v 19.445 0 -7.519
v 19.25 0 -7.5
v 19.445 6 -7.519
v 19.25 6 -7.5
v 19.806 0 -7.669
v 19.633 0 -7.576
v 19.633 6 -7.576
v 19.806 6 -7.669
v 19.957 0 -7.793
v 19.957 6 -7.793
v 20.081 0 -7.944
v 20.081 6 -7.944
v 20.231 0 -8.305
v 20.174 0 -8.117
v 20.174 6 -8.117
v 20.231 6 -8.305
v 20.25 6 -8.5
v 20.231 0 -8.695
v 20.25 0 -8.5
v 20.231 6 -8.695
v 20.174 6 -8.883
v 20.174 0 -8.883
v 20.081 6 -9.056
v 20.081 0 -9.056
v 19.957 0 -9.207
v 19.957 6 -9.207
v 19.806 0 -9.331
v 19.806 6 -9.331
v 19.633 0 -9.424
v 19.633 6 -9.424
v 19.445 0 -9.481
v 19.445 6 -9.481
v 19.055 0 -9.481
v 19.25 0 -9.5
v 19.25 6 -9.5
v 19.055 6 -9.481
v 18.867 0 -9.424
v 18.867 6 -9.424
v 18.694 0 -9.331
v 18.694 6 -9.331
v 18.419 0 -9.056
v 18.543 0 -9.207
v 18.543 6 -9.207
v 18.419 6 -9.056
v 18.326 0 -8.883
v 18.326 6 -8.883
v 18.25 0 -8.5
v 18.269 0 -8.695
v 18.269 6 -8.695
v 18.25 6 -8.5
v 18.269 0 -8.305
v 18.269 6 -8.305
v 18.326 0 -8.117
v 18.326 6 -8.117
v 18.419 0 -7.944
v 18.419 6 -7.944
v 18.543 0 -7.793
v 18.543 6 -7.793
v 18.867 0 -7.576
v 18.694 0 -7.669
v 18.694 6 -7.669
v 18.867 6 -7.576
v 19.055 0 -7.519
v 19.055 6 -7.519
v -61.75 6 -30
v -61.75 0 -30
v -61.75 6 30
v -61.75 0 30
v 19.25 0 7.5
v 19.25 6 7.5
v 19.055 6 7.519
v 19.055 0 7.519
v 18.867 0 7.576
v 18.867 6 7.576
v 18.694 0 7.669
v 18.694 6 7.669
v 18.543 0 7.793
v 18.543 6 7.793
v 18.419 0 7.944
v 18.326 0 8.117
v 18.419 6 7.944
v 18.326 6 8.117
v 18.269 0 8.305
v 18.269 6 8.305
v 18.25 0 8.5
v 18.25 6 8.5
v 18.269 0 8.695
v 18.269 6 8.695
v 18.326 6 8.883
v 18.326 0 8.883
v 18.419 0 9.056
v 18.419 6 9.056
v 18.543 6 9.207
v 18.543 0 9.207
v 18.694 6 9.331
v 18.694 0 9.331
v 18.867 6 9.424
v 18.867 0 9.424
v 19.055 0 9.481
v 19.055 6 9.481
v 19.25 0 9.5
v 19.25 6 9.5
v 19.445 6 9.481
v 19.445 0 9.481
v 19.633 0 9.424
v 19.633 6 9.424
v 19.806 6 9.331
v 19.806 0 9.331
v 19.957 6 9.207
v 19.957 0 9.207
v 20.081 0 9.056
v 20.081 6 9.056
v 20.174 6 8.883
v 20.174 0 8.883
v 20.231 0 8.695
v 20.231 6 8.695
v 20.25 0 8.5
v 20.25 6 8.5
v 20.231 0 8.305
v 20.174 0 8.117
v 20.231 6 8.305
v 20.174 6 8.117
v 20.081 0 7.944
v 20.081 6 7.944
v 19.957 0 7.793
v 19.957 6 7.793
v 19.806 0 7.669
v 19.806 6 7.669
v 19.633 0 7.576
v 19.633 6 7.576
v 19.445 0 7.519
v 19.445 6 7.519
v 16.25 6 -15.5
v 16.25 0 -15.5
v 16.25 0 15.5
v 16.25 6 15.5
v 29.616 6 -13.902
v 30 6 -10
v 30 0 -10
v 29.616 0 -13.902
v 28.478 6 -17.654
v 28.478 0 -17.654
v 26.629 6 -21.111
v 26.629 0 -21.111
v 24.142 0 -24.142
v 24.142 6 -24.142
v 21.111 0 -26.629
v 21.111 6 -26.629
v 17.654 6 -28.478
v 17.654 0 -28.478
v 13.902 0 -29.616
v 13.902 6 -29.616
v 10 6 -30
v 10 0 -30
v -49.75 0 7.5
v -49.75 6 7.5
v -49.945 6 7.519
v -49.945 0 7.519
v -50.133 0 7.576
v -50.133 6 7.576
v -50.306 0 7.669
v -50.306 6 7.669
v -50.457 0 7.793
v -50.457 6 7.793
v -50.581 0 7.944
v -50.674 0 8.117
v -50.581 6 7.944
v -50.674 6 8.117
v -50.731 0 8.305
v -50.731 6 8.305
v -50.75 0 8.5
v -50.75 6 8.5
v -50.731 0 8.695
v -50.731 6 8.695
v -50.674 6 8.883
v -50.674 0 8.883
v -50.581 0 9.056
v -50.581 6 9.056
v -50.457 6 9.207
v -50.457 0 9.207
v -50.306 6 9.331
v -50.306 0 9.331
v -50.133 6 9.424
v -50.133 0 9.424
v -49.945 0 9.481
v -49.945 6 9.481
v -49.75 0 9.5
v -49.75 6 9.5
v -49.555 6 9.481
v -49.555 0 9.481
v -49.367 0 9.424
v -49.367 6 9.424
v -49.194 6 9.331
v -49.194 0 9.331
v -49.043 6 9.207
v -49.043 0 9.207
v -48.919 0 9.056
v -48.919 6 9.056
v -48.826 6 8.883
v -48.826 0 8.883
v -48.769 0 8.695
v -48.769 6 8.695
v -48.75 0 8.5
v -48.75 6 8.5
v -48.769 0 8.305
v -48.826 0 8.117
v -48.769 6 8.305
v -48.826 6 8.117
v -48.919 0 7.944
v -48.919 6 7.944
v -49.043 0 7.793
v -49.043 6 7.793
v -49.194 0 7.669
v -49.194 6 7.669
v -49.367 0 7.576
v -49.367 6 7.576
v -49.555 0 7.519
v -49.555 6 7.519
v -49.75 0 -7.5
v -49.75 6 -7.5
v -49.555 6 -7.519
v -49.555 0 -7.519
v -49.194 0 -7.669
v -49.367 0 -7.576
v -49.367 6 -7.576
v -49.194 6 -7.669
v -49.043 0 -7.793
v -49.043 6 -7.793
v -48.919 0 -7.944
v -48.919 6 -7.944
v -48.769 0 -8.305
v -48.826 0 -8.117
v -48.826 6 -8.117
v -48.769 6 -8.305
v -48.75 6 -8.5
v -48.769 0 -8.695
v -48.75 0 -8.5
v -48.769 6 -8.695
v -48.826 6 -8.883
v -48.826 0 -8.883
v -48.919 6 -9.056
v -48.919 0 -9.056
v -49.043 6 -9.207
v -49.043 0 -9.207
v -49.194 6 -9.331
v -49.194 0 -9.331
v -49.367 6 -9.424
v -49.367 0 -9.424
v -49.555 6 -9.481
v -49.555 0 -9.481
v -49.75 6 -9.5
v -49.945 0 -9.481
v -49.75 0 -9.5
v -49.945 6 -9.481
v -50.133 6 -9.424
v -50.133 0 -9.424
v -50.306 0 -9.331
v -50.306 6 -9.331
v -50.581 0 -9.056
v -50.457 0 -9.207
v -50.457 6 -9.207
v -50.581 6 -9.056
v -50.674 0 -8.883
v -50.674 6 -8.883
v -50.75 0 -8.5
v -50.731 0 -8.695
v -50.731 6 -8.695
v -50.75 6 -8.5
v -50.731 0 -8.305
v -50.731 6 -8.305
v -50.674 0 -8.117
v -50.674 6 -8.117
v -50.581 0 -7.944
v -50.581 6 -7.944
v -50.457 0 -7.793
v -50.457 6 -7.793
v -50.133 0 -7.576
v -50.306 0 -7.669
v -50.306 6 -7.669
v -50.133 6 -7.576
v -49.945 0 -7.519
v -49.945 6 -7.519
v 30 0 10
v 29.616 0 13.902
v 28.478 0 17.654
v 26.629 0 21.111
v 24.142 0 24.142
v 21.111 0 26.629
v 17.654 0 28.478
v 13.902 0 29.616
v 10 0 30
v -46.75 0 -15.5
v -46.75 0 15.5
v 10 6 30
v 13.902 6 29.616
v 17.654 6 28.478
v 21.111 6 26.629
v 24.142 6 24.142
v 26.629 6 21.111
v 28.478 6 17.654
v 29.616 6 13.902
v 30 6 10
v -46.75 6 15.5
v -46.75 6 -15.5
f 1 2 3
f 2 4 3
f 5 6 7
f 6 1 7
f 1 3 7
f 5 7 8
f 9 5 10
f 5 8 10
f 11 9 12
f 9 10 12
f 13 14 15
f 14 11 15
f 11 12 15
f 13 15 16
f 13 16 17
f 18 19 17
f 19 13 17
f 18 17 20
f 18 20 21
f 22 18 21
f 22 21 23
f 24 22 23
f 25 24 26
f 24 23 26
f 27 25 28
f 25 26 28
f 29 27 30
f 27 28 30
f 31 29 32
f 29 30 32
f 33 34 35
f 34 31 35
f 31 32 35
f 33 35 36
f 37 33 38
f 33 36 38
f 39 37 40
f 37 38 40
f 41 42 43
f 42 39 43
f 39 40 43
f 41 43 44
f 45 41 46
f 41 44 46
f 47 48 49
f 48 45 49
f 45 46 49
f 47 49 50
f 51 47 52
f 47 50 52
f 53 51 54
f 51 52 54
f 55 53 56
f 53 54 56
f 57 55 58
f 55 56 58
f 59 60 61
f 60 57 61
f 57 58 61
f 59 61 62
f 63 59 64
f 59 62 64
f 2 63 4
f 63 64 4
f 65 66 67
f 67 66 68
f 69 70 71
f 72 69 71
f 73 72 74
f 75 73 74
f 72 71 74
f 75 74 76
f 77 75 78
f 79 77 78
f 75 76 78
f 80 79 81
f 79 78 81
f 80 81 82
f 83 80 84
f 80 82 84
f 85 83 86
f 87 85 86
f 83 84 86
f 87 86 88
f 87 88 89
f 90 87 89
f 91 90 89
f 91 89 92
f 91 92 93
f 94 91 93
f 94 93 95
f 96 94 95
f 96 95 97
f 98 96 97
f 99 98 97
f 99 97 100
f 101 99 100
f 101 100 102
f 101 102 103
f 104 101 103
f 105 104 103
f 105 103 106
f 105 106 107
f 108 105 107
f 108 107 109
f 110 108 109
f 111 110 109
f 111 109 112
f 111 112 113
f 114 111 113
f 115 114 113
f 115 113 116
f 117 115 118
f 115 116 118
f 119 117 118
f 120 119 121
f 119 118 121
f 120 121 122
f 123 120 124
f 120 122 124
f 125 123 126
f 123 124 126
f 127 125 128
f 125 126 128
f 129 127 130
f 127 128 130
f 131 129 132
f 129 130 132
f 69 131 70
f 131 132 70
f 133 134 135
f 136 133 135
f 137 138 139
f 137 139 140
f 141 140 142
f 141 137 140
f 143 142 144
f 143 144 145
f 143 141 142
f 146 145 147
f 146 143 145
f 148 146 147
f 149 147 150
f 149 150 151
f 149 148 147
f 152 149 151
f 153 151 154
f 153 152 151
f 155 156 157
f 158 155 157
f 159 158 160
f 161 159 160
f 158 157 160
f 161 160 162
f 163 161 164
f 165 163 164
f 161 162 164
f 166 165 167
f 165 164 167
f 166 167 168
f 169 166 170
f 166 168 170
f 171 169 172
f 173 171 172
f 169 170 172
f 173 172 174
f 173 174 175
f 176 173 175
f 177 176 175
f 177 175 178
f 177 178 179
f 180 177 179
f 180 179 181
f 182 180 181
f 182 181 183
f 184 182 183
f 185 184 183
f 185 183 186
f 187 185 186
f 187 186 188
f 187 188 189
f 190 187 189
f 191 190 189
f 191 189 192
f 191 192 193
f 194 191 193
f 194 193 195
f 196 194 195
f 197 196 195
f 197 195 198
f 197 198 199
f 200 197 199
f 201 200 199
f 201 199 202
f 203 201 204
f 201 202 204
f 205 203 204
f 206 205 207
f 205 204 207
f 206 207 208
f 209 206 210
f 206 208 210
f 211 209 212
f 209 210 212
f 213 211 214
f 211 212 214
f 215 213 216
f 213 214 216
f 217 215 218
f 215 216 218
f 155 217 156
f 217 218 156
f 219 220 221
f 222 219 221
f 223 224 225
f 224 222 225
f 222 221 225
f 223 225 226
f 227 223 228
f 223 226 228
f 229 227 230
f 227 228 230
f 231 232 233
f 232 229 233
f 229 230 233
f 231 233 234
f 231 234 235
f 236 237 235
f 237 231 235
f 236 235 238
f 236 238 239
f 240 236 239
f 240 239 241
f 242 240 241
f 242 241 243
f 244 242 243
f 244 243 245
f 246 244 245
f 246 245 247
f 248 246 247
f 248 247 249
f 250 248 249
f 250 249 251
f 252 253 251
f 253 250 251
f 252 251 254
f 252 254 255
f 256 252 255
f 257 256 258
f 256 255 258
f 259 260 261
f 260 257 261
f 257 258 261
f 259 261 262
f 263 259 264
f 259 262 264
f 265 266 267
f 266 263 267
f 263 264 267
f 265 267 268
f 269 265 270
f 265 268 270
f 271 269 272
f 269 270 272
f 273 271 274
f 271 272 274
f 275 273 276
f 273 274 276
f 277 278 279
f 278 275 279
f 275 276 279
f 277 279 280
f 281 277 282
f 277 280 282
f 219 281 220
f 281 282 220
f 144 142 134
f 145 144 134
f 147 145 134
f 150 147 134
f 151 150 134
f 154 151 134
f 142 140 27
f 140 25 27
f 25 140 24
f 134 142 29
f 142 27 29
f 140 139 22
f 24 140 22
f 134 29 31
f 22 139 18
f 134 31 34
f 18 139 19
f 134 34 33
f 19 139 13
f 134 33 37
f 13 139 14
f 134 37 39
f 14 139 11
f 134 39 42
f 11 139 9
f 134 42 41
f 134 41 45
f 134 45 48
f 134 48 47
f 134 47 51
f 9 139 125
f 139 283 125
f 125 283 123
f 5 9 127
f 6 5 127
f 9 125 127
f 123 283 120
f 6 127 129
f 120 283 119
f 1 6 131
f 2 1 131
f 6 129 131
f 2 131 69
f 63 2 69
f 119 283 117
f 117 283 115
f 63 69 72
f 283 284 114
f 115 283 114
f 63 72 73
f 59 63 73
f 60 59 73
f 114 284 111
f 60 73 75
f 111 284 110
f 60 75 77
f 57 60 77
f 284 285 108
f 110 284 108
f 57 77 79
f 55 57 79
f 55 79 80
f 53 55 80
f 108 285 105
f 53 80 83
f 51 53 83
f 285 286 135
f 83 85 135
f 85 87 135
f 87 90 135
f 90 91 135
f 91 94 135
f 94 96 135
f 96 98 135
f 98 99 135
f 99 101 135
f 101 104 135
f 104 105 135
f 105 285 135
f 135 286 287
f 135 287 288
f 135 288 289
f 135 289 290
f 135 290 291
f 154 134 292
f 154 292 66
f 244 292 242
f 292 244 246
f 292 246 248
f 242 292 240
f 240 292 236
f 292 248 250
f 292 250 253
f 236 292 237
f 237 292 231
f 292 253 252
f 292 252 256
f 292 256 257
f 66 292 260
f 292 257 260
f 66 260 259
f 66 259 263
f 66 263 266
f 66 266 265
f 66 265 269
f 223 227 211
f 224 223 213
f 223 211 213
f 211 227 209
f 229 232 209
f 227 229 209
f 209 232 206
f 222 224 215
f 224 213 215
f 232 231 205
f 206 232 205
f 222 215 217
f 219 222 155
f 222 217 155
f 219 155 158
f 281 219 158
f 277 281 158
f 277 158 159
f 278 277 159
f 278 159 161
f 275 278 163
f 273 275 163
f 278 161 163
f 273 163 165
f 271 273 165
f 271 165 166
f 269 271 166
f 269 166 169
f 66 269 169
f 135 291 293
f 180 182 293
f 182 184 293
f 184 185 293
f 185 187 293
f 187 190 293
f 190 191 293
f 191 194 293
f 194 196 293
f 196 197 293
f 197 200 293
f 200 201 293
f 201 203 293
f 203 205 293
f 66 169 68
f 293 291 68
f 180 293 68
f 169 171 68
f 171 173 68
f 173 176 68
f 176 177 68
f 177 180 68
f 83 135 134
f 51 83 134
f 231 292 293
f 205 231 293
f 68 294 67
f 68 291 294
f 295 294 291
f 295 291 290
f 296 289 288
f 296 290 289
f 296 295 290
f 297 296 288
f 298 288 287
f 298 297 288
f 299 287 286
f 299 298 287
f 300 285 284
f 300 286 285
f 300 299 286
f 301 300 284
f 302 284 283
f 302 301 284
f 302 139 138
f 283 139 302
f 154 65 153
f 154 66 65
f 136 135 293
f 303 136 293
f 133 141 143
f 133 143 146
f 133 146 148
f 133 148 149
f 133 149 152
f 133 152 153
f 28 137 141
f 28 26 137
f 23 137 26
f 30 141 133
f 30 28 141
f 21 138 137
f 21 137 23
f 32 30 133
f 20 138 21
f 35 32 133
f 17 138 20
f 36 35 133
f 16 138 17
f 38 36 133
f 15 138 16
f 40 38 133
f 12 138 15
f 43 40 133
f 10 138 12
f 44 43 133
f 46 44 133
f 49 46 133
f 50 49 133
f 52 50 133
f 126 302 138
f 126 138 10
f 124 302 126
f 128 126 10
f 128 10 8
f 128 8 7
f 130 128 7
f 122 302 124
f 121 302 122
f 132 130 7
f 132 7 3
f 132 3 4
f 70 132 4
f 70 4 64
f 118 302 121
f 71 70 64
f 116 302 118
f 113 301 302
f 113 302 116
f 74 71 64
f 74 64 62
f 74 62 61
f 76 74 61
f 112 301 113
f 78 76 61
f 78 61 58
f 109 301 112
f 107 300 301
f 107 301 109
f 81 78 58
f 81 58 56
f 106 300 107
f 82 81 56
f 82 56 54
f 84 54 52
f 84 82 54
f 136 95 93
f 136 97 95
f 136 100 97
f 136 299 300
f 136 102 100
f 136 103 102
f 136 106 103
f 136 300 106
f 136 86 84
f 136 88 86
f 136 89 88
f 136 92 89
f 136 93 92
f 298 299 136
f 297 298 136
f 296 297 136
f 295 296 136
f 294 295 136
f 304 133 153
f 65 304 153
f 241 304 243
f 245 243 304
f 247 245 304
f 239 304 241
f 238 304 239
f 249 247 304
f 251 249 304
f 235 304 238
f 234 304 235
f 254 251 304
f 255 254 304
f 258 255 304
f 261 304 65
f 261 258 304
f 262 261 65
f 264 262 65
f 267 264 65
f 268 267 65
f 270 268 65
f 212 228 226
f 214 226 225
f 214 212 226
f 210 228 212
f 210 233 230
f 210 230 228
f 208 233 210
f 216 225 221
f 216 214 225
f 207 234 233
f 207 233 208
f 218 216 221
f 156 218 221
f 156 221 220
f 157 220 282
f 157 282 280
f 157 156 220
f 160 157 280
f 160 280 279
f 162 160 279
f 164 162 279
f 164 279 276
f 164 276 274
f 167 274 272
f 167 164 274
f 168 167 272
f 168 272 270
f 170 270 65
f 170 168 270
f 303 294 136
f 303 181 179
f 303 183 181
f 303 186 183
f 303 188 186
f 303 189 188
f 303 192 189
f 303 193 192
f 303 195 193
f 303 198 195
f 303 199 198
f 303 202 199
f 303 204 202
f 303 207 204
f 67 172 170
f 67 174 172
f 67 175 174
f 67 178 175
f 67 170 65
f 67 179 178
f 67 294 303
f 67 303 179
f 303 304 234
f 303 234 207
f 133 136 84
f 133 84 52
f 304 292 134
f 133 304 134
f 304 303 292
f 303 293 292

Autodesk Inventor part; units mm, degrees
ref_plane "YZ Plane" through (0, 0, 0) normal (1, 0, 0) x (0, 1, 0)
ref_plane "XZ Plane" through (0, 0, 0) normal (0, 1, 0) x (-1, 0, 0)
ref_plane "XY Plane" through (0, 0, 0) normal (0, 0, 1) x (1, 0, 0)
sketch "Sketch1" plane through (0, 0, 0) normal (0, 1, 0) x (-1, 0, 0)
  line L0 (0, 0) -> (-16.25, 0)
  line L1 (0, 0) -> (46.75, 0)
  line L2 (300, 0) -> (330, 0) construction
  line L3 (330, 30) -> (-30, 30) construction
  line L4 (-16.25, 15.5) -> (46.75, 15.5)
  line L5 (46.75, 15.5) -> (46.75, 0)
  line L6 (46.75, -15.5) -> (-16.25, -15.5)
  line L7 (-16.25, -15.5) -> (-16.25, 0)
  line L8 (-16.25, 15.5) -> (46.75, -15.5) construction
  line L9 (46.75, 15.5) -> (-16.25, -15.5) construction
  line L10 (-19.25, 8.5) -> (49.75, 8.5) construction
  line L11 (49.75, 8.5) -> (49.75, -8.5) construction
  line L12 (49.75, -8.5) -> (-19.25, -8.5) construction
  line L13 (-19.25, -8.5) -> (-19.25, 8.5) construction
  line L14 (-19.25, 8.5) -> (49.75, -8.5) construction
  line L15 (49.75, 8.5) -> (-19.25, -8.5) construction
  line L16 (-30, 0) -> (-30, 30)
  line L17 (330, 0) -> (330, 30) construction
  line L18 (46.75, 0) -> (300, 0) construction
  line L19 (46.75, 0) -> (46.75, -15.5)
  line L20 (-16.25, 0) -> (-30, 0)
  line L21 (-16.25, 0) -> (-16.25, 15.5)
  line L22 (300, 0) -> (300, 18.5) construction
  line L23 (0, 0) -> (-30, 0) construction
  line L24 (46.75, 0) -> (61.75, 0)
  line L25 (61.75, 0) -> (61.75, 30)
  line L26 (-30, 30) -> (61.75, 30)
  point P0 (15.25, 0)
  point P1 (15.25, 0)
  point P2 (285, 0)
  dimension "d0" = 300
  dimension "d5" = 63
  dimension "d6" = 31
  dimension "d7" = 69
  dimension "d8" = 17
  dimension "d9" = 16.25
  dimension "d10" = 30
  dimension "d11" = 30
  dimension "d20" = 18.5
  dimension "d21" = 15
  dimension "d29" = 15
extrude "Extrusion1" add sketch "Sketch1" along normal blind 6 contours L20 L16 L26 L25 L24 L5 L4 L21
hole "Hole1" at (19.25, 0, 8.5) at (-49.75, 0, 8.5) direction (0, 1, 0) diameter 2 end through all
fillet "Fillet1" radius 20 1 edges at (30, 3, 30)
mirror "Mirror1" about plane through (30, 0, 0) normal (0, 0, -1)
properties part number "segment1c" material "Plywood, Finish"
